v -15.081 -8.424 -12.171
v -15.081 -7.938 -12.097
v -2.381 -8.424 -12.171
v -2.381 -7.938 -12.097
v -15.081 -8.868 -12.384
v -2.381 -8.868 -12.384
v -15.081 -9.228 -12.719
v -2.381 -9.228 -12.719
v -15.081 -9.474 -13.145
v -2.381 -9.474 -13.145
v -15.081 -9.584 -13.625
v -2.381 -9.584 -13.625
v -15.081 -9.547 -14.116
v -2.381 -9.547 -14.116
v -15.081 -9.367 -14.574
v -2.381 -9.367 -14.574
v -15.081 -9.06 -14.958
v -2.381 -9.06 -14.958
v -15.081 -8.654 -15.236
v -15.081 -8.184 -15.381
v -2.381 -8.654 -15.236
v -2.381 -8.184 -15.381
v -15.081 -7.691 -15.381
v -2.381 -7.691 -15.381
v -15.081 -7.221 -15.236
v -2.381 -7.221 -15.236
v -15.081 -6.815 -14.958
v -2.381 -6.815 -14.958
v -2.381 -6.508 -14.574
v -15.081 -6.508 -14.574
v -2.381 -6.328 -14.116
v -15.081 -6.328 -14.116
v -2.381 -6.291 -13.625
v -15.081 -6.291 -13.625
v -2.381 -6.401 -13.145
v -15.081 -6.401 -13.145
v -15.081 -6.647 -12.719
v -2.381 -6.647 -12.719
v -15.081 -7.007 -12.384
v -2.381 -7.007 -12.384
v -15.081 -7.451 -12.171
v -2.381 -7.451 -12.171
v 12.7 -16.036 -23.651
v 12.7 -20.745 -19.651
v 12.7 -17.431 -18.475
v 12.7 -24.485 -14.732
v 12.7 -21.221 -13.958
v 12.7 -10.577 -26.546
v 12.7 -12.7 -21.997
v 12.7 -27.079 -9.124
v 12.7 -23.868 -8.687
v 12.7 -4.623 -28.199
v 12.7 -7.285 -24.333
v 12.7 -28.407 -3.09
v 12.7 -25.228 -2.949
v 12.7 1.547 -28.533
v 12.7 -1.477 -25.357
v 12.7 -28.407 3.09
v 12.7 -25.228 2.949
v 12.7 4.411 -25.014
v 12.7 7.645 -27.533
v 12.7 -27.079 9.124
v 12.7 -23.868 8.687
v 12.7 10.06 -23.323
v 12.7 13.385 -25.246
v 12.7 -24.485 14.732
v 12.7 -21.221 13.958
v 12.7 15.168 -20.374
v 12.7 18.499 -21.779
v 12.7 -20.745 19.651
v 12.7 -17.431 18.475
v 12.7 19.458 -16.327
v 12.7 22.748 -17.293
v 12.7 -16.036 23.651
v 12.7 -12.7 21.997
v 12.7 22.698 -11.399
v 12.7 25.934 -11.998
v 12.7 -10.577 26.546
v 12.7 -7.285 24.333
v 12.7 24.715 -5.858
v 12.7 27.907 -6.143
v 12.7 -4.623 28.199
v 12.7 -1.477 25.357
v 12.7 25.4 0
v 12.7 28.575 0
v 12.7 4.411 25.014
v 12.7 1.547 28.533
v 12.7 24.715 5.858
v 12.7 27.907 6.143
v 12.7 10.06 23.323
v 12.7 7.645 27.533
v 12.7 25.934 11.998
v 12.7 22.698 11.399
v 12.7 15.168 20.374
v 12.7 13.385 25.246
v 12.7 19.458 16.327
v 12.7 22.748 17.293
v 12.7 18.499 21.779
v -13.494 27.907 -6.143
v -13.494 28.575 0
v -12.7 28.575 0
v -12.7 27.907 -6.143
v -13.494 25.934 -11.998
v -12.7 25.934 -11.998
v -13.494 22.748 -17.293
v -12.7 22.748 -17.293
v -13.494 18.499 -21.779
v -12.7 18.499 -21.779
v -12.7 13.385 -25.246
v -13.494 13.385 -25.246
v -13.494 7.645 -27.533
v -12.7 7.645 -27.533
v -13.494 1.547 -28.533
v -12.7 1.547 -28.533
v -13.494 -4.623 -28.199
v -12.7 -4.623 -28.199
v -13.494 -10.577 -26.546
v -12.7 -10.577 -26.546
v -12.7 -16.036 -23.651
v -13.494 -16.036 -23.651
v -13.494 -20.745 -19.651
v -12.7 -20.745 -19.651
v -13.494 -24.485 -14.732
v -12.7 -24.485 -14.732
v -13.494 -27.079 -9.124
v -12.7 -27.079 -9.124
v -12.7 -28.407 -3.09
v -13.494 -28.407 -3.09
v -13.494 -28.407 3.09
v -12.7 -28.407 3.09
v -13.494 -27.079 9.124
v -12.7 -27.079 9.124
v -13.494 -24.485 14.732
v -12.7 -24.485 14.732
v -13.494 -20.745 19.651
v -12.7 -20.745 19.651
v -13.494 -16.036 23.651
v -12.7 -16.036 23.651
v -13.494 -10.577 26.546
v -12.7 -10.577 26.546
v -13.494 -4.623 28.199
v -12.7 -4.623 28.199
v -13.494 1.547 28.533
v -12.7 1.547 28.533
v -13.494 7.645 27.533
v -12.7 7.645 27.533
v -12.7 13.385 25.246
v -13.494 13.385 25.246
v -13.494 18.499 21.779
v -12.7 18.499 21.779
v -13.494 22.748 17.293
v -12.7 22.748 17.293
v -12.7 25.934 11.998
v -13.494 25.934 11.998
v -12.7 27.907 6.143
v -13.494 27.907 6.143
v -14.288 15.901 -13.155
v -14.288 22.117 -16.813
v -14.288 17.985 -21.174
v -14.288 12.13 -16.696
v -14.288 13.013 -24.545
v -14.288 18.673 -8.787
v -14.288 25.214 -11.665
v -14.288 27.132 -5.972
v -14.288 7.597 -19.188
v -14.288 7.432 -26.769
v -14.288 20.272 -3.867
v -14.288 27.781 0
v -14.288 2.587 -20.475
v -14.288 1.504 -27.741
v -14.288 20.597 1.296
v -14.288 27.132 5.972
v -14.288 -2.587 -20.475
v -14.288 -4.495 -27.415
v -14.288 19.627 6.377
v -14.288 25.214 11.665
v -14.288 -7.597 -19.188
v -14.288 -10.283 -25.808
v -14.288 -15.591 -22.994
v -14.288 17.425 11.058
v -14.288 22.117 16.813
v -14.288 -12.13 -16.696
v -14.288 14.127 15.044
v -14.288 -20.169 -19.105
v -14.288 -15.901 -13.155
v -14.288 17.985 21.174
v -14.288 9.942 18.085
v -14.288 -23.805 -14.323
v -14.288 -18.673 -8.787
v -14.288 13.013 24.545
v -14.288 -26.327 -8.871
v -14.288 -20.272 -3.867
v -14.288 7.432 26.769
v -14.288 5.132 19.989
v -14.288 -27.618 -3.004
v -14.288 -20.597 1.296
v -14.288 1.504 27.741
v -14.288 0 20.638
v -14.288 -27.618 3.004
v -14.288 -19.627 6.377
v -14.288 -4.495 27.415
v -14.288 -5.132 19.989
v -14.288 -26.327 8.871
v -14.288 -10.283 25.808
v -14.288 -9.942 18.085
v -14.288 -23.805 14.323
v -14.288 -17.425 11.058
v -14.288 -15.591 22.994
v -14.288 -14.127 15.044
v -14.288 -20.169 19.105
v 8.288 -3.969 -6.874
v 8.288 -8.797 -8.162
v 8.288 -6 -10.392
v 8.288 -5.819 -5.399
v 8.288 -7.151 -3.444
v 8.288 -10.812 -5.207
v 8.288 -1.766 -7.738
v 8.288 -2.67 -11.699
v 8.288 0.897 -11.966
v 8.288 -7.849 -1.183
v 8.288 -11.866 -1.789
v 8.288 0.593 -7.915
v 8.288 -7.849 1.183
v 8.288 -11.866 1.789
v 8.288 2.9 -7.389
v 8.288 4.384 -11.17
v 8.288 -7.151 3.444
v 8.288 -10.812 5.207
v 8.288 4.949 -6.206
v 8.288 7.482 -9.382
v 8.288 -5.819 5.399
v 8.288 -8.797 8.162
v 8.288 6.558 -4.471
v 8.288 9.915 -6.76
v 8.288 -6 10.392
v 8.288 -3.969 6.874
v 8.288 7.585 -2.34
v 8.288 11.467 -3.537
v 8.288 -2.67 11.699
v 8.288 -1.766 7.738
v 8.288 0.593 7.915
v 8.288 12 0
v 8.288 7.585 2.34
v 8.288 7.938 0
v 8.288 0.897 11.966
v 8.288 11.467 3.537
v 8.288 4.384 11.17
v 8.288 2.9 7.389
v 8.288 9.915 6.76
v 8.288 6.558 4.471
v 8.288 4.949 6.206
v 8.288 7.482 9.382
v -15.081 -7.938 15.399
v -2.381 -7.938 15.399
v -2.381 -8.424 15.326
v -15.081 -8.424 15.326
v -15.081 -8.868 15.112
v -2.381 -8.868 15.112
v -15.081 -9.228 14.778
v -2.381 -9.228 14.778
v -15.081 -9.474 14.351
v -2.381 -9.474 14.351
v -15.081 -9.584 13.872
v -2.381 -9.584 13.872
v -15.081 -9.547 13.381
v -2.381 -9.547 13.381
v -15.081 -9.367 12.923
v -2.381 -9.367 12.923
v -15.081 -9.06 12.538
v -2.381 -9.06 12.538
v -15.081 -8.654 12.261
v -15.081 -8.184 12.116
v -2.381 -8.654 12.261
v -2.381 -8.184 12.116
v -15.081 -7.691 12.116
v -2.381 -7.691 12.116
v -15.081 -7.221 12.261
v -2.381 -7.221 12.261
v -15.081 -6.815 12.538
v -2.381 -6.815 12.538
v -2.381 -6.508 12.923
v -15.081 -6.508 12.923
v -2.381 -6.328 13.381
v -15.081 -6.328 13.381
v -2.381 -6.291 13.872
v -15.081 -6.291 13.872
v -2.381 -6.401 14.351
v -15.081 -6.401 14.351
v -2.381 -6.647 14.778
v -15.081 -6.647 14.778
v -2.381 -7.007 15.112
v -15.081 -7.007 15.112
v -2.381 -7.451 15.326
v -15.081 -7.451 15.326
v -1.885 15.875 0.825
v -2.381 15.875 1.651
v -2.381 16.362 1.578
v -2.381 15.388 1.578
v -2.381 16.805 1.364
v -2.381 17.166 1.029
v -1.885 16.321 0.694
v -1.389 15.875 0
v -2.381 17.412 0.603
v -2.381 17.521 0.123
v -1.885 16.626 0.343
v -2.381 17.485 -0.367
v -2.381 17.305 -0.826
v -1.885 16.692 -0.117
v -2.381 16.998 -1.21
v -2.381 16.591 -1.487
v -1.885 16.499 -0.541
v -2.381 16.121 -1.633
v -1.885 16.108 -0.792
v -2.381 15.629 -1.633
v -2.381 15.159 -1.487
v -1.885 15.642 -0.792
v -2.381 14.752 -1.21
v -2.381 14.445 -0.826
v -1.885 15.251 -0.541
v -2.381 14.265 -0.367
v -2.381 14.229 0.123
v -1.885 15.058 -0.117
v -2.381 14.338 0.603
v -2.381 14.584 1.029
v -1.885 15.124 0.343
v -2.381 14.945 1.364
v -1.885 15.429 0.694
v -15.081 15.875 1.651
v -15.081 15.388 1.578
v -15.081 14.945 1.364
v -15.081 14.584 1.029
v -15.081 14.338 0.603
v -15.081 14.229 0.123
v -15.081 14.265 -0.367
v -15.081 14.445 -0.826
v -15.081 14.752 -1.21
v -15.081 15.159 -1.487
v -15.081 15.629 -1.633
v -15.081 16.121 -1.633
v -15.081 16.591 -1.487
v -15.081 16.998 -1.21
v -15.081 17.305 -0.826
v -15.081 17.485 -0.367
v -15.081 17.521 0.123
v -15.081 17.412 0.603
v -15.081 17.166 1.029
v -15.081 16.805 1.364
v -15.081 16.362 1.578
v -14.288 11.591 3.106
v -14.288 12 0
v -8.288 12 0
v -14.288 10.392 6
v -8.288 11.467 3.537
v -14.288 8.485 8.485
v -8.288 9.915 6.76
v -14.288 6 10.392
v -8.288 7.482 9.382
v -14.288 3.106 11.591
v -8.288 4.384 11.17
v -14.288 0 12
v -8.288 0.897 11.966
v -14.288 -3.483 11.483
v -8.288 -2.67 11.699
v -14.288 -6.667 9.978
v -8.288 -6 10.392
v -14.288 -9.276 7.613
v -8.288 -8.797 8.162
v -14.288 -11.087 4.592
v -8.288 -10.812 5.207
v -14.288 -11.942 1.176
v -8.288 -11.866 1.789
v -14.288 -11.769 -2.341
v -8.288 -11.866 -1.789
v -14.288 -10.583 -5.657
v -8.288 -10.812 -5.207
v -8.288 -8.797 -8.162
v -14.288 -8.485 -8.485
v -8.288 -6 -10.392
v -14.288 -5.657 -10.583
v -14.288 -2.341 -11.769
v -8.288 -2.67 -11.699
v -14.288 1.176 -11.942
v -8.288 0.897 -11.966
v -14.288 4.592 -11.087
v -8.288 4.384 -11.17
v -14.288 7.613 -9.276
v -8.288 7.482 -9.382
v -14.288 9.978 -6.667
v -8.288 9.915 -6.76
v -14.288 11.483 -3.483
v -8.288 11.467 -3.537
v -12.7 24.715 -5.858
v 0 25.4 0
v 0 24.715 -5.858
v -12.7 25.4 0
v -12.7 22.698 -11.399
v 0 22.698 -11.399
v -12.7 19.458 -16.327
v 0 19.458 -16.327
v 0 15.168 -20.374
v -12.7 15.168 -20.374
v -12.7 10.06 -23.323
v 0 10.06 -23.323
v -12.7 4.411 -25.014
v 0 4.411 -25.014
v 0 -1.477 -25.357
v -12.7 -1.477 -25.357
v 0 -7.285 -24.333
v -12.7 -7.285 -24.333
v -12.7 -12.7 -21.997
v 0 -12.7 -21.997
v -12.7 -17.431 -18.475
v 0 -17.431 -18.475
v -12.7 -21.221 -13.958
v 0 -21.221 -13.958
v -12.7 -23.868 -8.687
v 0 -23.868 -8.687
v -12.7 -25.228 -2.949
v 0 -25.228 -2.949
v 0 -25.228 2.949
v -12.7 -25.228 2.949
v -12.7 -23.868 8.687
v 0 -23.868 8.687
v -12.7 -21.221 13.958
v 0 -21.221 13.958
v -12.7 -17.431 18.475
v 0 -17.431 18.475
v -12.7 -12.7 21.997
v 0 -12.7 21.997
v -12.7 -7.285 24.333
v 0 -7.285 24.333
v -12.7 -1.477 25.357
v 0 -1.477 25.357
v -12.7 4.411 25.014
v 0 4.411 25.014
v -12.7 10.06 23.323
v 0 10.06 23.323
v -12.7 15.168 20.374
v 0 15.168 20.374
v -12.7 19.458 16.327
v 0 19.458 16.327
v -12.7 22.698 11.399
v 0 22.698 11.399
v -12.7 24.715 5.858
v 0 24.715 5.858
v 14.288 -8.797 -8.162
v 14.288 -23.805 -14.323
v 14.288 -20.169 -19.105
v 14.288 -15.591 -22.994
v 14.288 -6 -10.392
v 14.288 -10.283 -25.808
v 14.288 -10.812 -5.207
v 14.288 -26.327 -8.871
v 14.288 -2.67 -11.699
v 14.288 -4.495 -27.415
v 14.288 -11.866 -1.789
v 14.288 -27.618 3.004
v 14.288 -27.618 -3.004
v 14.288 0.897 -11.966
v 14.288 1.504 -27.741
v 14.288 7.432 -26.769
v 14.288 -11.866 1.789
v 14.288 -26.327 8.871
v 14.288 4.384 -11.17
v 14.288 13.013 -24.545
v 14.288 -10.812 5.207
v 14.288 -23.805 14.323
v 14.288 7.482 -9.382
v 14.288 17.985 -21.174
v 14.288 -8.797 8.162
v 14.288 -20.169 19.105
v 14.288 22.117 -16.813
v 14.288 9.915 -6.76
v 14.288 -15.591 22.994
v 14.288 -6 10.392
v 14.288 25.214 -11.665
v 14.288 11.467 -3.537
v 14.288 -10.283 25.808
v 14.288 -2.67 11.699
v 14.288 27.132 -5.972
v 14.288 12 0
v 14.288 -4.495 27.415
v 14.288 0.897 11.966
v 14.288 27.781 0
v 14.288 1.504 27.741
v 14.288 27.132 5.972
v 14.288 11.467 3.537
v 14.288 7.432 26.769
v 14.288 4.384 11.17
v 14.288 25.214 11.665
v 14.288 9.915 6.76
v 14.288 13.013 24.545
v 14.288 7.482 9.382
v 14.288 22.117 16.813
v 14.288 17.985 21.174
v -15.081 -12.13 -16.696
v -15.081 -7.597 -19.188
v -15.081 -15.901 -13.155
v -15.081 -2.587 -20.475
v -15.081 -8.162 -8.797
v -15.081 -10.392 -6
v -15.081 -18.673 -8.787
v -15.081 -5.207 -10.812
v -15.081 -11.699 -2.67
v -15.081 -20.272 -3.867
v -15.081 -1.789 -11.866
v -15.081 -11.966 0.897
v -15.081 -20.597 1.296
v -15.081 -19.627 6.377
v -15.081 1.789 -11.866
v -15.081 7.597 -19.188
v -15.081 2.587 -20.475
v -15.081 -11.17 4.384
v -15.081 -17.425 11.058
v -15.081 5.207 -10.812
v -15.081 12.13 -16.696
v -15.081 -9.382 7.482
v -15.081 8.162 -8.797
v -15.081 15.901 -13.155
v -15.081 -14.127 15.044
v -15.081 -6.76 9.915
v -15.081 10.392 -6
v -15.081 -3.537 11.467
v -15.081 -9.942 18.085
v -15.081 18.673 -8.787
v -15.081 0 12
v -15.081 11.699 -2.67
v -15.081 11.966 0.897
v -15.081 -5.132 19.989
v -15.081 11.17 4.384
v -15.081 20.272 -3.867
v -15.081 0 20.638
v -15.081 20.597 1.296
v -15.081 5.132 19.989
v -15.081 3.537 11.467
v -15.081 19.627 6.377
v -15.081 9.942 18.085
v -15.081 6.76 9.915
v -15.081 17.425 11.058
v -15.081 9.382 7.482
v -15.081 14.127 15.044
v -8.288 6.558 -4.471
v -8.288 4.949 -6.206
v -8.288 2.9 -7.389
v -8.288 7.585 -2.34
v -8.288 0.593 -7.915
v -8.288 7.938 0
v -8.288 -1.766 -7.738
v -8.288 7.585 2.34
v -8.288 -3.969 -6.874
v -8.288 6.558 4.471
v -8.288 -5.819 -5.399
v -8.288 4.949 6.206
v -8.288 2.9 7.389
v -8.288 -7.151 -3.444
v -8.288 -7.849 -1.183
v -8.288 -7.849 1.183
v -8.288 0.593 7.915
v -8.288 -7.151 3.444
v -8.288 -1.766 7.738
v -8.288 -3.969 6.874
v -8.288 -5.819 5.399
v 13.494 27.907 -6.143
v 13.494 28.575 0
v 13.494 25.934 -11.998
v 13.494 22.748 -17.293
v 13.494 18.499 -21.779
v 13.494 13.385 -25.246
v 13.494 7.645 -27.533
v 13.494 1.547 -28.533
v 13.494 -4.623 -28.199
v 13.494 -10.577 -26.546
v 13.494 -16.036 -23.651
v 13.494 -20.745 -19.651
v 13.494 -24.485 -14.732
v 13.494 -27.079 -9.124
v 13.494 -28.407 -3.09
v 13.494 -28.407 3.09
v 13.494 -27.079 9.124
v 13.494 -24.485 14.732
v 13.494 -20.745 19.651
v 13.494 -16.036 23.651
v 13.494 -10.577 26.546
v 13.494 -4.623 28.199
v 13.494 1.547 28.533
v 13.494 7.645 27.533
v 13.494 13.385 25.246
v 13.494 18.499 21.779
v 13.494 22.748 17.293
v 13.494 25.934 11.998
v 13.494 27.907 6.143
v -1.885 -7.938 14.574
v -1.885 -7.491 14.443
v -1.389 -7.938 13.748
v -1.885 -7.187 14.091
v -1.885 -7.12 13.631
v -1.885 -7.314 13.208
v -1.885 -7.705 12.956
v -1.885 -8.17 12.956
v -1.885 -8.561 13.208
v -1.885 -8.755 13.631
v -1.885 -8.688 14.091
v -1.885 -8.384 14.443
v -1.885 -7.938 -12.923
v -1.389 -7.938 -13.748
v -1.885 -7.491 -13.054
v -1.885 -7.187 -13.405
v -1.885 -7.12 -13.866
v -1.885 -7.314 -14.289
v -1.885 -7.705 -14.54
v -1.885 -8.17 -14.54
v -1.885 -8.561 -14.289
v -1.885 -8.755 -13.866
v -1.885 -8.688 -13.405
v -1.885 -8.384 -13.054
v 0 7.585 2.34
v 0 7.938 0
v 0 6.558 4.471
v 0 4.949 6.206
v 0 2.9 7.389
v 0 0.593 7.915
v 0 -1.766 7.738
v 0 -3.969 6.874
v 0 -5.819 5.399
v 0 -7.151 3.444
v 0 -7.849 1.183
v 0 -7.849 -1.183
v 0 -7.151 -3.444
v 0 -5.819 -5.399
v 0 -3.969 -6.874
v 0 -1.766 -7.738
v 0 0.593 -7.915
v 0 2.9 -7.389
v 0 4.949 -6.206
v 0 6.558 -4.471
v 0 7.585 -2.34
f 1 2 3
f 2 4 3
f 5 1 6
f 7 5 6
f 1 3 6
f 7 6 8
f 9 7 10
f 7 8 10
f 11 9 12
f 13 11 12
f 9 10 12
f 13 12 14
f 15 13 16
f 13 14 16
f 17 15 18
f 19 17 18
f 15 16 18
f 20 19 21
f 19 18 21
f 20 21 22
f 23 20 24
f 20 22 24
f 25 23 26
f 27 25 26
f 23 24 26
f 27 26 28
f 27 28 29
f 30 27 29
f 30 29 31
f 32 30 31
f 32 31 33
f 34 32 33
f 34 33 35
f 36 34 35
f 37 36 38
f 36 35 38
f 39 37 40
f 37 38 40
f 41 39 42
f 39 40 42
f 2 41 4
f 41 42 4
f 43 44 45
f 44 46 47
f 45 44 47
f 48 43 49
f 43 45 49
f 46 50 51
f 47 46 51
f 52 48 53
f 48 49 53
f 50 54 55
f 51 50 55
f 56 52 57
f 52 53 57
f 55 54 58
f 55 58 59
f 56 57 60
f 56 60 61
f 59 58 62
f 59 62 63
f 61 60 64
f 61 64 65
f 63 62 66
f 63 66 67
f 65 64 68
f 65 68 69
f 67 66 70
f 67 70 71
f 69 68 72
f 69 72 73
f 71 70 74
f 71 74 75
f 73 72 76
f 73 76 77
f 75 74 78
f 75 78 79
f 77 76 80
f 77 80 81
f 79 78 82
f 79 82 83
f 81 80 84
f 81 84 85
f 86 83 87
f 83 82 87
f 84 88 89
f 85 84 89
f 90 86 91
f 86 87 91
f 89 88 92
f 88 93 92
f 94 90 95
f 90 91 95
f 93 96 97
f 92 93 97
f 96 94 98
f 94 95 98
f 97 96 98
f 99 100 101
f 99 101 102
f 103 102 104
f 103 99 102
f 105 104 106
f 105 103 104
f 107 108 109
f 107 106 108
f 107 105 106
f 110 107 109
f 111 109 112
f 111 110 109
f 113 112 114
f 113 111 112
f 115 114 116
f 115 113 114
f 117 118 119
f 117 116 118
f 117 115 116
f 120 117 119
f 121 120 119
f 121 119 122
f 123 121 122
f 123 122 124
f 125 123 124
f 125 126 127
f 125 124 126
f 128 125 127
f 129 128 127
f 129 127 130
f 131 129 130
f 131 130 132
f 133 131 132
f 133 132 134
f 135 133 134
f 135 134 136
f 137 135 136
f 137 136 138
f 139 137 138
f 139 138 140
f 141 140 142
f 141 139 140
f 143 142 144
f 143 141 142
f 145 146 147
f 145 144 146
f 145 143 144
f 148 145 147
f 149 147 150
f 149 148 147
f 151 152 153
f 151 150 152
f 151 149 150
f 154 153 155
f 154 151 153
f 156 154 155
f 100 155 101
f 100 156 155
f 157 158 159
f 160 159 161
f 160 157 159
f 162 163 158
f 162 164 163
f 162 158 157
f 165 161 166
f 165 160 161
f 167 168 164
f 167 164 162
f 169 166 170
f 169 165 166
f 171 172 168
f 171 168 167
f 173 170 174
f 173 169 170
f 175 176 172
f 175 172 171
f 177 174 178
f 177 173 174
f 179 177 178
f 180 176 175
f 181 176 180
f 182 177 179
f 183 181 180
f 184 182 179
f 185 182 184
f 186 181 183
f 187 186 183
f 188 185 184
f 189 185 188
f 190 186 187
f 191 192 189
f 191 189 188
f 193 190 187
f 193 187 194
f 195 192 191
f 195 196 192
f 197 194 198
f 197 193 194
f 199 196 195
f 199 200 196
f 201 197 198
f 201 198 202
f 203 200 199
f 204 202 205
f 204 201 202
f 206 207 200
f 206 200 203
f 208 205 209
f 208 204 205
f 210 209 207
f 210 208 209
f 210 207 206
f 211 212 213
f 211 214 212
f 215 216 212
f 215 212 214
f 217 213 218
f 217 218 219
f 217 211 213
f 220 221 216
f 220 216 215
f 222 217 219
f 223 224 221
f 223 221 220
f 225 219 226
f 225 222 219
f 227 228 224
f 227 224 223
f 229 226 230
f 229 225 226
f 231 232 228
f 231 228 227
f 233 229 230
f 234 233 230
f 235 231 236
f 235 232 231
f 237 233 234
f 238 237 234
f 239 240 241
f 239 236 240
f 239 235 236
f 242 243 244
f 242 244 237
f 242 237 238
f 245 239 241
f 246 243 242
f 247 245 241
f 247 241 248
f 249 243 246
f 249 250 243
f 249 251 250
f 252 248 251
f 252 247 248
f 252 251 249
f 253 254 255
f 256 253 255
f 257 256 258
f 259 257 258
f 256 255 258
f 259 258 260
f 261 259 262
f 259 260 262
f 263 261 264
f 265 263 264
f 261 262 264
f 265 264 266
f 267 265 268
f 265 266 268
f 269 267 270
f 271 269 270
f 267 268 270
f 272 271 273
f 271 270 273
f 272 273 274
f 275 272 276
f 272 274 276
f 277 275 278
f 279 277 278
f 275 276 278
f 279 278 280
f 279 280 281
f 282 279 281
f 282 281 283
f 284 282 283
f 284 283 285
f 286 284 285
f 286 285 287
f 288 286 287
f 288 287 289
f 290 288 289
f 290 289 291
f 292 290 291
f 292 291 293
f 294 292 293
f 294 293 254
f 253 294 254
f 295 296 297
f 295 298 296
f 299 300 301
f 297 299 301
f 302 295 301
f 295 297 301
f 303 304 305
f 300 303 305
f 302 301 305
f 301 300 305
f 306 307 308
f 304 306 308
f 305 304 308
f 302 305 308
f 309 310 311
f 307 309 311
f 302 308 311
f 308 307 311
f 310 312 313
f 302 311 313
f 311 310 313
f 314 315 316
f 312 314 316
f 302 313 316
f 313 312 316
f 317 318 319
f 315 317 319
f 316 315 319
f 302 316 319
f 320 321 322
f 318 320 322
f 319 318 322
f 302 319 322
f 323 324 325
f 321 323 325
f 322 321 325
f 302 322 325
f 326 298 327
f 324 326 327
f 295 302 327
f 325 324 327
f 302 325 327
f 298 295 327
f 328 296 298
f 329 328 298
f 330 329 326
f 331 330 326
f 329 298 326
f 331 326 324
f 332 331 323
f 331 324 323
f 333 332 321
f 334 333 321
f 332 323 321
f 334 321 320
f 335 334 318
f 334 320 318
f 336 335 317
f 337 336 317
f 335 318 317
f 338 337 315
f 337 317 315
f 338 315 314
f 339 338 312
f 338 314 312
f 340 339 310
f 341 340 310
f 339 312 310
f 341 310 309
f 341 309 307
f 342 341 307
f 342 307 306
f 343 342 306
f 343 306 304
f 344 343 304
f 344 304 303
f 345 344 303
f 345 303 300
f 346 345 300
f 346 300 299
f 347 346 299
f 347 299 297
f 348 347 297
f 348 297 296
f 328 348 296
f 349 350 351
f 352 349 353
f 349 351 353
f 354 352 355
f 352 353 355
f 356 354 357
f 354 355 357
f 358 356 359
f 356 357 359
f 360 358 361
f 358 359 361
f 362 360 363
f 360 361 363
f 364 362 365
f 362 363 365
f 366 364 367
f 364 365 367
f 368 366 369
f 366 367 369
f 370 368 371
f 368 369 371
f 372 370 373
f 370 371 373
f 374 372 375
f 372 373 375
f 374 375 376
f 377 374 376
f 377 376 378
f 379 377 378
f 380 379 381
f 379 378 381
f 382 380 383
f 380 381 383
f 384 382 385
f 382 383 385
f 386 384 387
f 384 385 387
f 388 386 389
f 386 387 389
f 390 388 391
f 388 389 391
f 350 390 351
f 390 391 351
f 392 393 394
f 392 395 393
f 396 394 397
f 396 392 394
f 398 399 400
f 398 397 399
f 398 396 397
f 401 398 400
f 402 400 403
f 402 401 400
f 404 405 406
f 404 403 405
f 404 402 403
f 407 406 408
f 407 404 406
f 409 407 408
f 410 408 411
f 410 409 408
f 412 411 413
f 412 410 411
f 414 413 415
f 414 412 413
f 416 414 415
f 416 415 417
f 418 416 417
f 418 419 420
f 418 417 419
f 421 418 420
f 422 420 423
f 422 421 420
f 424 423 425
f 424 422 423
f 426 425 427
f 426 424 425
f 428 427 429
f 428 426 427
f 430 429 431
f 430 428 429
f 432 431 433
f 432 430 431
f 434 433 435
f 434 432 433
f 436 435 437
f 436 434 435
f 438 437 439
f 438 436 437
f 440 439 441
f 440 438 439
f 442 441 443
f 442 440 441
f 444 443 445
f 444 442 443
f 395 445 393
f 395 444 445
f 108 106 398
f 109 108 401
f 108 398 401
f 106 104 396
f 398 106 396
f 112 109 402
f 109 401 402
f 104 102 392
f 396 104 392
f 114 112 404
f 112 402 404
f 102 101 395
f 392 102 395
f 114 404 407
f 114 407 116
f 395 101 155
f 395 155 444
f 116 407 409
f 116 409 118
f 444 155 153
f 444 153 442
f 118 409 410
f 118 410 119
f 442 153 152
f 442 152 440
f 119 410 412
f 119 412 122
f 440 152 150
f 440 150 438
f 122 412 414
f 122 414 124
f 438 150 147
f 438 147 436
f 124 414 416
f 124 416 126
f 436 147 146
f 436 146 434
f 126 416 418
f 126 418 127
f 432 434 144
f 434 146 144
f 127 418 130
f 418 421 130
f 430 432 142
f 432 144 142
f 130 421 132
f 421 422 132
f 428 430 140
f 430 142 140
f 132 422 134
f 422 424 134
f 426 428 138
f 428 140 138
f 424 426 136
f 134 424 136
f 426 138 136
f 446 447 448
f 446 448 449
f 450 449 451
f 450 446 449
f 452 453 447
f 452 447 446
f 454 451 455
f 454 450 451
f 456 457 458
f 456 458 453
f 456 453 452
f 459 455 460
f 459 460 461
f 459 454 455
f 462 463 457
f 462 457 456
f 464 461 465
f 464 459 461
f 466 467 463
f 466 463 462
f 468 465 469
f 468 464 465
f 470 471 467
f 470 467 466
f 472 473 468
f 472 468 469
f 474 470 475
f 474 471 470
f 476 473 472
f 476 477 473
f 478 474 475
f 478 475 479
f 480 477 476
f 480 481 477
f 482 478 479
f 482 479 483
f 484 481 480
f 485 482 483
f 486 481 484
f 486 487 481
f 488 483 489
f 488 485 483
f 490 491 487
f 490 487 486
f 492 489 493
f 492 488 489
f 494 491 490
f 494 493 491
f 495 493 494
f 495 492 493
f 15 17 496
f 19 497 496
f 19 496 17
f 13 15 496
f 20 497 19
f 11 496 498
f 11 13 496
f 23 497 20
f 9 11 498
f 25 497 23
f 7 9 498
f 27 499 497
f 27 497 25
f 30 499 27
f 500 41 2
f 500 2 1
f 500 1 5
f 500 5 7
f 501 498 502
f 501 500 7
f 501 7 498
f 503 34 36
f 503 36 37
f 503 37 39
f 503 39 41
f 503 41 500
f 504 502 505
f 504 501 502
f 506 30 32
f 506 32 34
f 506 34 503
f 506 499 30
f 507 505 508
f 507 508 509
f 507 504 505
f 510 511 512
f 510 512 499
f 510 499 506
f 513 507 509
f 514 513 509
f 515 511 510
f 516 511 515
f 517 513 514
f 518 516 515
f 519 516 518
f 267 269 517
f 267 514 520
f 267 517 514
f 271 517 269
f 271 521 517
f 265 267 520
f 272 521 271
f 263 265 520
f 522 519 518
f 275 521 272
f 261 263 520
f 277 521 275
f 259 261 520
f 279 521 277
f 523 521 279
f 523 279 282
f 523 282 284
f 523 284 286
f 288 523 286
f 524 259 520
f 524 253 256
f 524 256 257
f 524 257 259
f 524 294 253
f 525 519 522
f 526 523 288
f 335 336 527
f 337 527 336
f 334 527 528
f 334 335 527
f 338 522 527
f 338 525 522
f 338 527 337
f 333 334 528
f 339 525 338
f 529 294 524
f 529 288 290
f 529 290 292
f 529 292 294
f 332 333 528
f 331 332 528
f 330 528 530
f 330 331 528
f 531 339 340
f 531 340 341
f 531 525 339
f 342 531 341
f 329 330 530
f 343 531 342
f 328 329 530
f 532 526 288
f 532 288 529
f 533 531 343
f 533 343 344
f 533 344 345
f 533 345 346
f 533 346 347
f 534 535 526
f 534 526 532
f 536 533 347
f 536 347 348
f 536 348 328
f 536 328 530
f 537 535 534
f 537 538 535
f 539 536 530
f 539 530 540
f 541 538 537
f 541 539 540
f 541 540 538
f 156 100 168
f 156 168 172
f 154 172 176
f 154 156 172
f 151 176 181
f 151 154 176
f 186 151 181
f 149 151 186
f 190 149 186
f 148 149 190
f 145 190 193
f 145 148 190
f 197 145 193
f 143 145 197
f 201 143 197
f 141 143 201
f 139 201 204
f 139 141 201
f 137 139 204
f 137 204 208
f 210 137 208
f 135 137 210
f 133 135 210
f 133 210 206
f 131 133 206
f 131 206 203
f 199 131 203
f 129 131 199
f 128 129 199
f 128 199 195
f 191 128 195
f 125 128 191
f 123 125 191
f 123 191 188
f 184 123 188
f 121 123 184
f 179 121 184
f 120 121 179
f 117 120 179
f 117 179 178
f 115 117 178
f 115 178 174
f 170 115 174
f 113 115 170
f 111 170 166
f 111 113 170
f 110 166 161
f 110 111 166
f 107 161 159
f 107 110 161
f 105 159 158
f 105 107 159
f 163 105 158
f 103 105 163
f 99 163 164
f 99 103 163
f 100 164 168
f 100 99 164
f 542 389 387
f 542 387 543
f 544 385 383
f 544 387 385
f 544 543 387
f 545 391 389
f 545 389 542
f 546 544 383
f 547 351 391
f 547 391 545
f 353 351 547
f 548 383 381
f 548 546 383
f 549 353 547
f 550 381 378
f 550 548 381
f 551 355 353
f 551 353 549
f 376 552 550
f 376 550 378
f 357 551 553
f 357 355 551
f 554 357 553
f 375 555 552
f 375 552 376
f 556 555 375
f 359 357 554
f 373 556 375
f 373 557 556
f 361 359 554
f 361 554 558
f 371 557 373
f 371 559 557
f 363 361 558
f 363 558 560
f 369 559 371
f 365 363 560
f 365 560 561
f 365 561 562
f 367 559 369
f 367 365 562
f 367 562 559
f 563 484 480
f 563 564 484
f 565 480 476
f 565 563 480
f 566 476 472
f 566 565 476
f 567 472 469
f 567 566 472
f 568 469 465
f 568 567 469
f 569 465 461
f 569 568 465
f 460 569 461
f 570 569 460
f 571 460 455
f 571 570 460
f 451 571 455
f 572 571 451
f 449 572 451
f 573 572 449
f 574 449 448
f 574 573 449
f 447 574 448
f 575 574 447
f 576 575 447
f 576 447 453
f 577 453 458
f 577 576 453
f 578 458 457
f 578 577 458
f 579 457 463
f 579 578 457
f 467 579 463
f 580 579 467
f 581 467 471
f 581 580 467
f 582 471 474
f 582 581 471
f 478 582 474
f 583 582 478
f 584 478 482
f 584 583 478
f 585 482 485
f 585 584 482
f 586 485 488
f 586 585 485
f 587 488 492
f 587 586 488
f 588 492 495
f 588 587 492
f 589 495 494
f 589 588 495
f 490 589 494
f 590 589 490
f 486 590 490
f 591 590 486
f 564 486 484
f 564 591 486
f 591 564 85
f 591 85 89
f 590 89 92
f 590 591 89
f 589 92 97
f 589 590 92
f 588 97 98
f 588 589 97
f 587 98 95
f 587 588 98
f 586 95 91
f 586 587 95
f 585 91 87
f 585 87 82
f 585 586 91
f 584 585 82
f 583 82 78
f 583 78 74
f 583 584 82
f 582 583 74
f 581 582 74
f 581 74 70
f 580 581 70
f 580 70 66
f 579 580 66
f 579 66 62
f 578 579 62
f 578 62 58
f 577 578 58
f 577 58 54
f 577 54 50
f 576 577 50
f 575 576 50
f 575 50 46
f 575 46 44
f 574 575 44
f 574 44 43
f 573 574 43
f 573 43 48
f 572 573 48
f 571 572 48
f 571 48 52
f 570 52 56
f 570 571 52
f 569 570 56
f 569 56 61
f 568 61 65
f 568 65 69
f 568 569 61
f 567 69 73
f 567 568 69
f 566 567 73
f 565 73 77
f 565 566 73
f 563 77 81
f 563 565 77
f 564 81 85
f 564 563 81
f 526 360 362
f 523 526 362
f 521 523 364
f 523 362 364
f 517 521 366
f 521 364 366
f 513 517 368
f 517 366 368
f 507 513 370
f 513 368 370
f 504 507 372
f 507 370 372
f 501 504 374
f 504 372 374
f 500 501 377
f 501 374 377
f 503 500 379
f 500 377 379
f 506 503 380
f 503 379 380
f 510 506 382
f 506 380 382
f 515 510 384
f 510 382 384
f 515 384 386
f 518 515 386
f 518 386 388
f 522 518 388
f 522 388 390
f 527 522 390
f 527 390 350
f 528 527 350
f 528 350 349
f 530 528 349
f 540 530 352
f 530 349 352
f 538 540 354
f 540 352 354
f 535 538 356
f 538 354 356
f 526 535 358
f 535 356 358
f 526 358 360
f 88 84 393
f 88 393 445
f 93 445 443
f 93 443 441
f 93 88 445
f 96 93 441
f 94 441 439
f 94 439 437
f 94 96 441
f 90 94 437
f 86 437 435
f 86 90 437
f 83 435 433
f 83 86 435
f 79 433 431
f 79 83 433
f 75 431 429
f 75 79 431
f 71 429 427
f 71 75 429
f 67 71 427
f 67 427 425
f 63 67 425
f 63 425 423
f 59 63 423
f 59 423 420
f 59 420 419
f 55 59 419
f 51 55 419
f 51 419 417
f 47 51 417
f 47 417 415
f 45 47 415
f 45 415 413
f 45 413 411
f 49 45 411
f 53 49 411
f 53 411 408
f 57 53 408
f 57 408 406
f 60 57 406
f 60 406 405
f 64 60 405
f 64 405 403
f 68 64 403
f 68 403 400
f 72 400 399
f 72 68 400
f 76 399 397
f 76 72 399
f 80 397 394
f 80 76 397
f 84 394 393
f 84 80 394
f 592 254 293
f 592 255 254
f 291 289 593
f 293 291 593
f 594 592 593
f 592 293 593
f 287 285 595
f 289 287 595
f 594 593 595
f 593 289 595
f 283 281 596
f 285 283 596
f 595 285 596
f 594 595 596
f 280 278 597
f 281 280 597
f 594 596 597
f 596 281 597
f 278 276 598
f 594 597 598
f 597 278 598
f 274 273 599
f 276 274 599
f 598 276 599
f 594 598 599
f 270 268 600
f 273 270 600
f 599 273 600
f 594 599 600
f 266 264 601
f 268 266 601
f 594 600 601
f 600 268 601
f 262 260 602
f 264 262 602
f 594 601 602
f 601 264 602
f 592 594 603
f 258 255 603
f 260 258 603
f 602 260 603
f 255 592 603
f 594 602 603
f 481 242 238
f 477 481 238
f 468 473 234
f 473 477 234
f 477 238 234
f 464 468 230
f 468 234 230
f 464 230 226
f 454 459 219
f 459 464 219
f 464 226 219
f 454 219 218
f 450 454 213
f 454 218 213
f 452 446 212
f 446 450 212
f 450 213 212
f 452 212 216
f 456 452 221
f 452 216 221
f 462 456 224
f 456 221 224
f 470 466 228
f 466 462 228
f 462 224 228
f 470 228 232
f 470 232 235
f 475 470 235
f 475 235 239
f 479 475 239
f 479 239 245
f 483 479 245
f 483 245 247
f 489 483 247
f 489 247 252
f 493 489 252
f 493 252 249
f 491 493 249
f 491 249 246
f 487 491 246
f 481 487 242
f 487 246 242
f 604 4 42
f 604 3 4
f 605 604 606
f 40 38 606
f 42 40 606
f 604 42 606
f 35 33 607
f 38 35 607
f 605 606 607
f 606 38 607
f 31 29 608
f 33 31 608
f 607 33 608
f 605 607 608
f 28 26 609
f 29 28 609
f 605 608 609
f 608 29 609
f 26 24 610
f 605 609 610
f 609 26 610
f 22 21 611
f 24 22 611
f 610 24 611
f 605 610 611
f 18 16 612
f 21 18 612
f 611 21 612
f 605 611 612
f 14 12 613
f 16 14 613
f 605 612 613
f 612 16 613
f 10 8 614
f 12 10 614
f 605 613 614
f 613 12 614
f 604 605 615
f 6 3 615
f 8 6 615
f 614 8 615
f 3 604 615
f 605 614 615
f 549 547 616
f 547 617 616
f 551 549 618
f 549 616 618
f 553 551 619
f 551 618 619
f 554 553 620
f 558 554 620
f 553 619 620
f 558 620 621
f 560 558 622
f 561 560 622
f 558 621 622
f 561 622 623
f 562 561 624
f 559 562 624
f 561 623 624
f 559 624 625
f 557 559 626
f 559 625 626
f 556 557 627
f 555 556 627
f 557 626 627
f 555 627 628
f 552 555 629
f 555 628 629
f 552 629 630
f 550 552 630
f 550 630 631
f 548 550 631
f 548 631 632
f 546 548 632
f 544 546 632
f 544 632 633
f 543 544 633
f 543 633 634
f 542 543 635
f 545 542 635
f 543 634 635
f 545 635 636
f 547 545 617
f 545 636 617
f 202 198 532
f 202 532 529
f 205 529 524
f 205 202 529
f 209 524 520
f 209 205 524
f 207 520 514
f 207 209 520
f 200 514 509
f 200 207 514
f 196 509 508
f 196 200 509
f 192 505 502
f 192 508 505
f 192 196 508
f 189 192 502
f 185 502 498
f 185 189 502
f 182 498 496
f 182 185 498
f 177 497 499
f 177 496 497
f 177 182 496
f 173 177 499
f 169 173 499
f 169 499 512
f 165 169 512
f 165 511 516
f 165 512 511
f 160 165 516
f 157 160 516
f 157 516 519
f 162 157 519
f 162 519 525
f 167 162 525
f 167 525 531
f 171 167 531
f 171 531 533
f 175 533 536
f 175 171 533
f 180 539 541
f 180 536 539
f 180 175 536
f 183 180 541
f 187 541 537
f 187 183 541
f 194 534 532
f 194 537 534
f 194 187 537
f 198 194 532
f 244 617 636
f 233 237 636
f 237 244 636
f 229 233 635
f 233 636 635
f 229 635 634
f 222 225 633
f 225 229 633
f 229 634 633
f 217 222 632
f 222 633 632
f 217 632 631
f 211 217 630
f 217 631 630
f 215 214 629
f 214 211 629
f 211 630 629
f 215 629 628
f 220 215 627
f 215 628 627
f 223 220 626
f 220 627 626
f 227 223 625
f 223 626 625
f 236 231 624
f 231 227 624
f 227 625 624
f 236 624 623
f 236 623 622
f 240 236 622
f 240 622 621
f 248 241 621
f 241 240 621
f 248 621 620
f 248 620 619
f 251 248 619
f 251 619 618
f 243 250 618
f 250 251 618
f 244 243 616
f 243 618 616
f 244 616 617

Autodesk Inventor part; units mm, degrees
ref_plane "YZ Plane" through (0, 0, 0) normal (1, 0, 0) x (0, 1, 0)
ref_plane "XZ Plane" through (0, 0, 0) normal (0, 1, 0) x (-1, 0, 0)
ref_plane "XY Plane" through (0, 0, 0) normal (0, 0, 1) x (1, 0, 0)
sketch "Sketch1" plane through (0, 0, 0) normal (0, 0, 1) x (1, 0, 0)
  line L0 (0, 0) -> (0, 7.9375) construction
  line L1 (0, 25.4) -> (12.7, 25.4)
  line L2 (12.7, 25.4) -> (12.7, 28.575)
  line L3 (12.7, 28.575) -> (14.2875, 28.575)
  line L4 (14.2875, 28.575) -> (14.2875, 12)
  line L5 (14.2875, 12) -> (8.2875, 12)
  line L6 (8.2875, 12) -> (8.2875, 7.9375)
  line L7 (8.2875, 7.9375) -> (0, 7.9375)
  line L8 (0, 0) -> (14.2875, 0) construction
  line L9 (14.2875, 0) -> (14.2875, 12) construction
  line L10 (0, 7.9375) -> (0, 25.4)
  dimension "d3" = 25.4
  dimension "d4" = 28.575
  dimension "d5" = 12
  dimension "d6" = 7.9375
  dimension "d7" = 6
  dimension "d8" = 14.2875
  dimension "d9" = 1.5875
revolve "Revolution1" add sketch "Sketch1" angle 360 about axis through (0, 0, 0) along (1, 0, 0)
mirror "Mirror1" about plane through (0, 25.4, 0) normal (-1, 0, 0)
sketch "Sketch2" plane through (-14.2875, 0, 0) normal (-1, 0, 0) x (0, 0, 1)
  circle A0 centre (0, 0) radius 12 projected
  circle A1 centre (0, 0) radius 28.575 projected
  circle A2 centre (0, 0) radius 15.875 construction
  line L0 (0, 0) -> (0, 15.875) construction
  circle A3 centre (0, 15.875) radius 2.54 construction
  circle A4 centre (-13.7482, -7.9375) radius 2.54 construction
  circle A5 centre (13.7482, -7.9375) radius 2.54 construction
  circle A6 centre (0, 0) radius 20.6375
  point P0 (0, 13.335)
  point P1 (0, 12)
  dimension "d11" = 5.08
  dimension "d27" = 31.75
  dimension "d15" = 360
  dimension "d28" = 5.08
  dimension "d29" = 5.08
  dimension "d40" = 41.275
chamfer "Chamfer1" distance 0.7937 angle 45 2 edges at (-14.2875, -28.575, 0) (14.2875, -28.575, 0)
extrude "Extrusion2" add sketch "Sketch2" along normal blind 0.7937 contours A6
sketch "Sketch4" plane through (-15.0812, 0, 0) normal (-1, 0, 0) x (0, 0, 1)
  point P0 (0, 15.875)
  point P1 (-13.7482, -7.9375)
  point P2 (13.7482, -7.9375)
hole "Hole3" at (-15.0812, -7.9375, 13.7482) at (-15.0812, -7.9375, -13.7482) at (-15.0813, 15.875, 0) direction (1, 0, 0) diameter 3.302 depth 12.7 tip angle 118 thread size "8-32 UNC" class "2B" standard "ANSI Unified Screw Threads"
properties part number "Wheel" material "Aluminum 6061"
